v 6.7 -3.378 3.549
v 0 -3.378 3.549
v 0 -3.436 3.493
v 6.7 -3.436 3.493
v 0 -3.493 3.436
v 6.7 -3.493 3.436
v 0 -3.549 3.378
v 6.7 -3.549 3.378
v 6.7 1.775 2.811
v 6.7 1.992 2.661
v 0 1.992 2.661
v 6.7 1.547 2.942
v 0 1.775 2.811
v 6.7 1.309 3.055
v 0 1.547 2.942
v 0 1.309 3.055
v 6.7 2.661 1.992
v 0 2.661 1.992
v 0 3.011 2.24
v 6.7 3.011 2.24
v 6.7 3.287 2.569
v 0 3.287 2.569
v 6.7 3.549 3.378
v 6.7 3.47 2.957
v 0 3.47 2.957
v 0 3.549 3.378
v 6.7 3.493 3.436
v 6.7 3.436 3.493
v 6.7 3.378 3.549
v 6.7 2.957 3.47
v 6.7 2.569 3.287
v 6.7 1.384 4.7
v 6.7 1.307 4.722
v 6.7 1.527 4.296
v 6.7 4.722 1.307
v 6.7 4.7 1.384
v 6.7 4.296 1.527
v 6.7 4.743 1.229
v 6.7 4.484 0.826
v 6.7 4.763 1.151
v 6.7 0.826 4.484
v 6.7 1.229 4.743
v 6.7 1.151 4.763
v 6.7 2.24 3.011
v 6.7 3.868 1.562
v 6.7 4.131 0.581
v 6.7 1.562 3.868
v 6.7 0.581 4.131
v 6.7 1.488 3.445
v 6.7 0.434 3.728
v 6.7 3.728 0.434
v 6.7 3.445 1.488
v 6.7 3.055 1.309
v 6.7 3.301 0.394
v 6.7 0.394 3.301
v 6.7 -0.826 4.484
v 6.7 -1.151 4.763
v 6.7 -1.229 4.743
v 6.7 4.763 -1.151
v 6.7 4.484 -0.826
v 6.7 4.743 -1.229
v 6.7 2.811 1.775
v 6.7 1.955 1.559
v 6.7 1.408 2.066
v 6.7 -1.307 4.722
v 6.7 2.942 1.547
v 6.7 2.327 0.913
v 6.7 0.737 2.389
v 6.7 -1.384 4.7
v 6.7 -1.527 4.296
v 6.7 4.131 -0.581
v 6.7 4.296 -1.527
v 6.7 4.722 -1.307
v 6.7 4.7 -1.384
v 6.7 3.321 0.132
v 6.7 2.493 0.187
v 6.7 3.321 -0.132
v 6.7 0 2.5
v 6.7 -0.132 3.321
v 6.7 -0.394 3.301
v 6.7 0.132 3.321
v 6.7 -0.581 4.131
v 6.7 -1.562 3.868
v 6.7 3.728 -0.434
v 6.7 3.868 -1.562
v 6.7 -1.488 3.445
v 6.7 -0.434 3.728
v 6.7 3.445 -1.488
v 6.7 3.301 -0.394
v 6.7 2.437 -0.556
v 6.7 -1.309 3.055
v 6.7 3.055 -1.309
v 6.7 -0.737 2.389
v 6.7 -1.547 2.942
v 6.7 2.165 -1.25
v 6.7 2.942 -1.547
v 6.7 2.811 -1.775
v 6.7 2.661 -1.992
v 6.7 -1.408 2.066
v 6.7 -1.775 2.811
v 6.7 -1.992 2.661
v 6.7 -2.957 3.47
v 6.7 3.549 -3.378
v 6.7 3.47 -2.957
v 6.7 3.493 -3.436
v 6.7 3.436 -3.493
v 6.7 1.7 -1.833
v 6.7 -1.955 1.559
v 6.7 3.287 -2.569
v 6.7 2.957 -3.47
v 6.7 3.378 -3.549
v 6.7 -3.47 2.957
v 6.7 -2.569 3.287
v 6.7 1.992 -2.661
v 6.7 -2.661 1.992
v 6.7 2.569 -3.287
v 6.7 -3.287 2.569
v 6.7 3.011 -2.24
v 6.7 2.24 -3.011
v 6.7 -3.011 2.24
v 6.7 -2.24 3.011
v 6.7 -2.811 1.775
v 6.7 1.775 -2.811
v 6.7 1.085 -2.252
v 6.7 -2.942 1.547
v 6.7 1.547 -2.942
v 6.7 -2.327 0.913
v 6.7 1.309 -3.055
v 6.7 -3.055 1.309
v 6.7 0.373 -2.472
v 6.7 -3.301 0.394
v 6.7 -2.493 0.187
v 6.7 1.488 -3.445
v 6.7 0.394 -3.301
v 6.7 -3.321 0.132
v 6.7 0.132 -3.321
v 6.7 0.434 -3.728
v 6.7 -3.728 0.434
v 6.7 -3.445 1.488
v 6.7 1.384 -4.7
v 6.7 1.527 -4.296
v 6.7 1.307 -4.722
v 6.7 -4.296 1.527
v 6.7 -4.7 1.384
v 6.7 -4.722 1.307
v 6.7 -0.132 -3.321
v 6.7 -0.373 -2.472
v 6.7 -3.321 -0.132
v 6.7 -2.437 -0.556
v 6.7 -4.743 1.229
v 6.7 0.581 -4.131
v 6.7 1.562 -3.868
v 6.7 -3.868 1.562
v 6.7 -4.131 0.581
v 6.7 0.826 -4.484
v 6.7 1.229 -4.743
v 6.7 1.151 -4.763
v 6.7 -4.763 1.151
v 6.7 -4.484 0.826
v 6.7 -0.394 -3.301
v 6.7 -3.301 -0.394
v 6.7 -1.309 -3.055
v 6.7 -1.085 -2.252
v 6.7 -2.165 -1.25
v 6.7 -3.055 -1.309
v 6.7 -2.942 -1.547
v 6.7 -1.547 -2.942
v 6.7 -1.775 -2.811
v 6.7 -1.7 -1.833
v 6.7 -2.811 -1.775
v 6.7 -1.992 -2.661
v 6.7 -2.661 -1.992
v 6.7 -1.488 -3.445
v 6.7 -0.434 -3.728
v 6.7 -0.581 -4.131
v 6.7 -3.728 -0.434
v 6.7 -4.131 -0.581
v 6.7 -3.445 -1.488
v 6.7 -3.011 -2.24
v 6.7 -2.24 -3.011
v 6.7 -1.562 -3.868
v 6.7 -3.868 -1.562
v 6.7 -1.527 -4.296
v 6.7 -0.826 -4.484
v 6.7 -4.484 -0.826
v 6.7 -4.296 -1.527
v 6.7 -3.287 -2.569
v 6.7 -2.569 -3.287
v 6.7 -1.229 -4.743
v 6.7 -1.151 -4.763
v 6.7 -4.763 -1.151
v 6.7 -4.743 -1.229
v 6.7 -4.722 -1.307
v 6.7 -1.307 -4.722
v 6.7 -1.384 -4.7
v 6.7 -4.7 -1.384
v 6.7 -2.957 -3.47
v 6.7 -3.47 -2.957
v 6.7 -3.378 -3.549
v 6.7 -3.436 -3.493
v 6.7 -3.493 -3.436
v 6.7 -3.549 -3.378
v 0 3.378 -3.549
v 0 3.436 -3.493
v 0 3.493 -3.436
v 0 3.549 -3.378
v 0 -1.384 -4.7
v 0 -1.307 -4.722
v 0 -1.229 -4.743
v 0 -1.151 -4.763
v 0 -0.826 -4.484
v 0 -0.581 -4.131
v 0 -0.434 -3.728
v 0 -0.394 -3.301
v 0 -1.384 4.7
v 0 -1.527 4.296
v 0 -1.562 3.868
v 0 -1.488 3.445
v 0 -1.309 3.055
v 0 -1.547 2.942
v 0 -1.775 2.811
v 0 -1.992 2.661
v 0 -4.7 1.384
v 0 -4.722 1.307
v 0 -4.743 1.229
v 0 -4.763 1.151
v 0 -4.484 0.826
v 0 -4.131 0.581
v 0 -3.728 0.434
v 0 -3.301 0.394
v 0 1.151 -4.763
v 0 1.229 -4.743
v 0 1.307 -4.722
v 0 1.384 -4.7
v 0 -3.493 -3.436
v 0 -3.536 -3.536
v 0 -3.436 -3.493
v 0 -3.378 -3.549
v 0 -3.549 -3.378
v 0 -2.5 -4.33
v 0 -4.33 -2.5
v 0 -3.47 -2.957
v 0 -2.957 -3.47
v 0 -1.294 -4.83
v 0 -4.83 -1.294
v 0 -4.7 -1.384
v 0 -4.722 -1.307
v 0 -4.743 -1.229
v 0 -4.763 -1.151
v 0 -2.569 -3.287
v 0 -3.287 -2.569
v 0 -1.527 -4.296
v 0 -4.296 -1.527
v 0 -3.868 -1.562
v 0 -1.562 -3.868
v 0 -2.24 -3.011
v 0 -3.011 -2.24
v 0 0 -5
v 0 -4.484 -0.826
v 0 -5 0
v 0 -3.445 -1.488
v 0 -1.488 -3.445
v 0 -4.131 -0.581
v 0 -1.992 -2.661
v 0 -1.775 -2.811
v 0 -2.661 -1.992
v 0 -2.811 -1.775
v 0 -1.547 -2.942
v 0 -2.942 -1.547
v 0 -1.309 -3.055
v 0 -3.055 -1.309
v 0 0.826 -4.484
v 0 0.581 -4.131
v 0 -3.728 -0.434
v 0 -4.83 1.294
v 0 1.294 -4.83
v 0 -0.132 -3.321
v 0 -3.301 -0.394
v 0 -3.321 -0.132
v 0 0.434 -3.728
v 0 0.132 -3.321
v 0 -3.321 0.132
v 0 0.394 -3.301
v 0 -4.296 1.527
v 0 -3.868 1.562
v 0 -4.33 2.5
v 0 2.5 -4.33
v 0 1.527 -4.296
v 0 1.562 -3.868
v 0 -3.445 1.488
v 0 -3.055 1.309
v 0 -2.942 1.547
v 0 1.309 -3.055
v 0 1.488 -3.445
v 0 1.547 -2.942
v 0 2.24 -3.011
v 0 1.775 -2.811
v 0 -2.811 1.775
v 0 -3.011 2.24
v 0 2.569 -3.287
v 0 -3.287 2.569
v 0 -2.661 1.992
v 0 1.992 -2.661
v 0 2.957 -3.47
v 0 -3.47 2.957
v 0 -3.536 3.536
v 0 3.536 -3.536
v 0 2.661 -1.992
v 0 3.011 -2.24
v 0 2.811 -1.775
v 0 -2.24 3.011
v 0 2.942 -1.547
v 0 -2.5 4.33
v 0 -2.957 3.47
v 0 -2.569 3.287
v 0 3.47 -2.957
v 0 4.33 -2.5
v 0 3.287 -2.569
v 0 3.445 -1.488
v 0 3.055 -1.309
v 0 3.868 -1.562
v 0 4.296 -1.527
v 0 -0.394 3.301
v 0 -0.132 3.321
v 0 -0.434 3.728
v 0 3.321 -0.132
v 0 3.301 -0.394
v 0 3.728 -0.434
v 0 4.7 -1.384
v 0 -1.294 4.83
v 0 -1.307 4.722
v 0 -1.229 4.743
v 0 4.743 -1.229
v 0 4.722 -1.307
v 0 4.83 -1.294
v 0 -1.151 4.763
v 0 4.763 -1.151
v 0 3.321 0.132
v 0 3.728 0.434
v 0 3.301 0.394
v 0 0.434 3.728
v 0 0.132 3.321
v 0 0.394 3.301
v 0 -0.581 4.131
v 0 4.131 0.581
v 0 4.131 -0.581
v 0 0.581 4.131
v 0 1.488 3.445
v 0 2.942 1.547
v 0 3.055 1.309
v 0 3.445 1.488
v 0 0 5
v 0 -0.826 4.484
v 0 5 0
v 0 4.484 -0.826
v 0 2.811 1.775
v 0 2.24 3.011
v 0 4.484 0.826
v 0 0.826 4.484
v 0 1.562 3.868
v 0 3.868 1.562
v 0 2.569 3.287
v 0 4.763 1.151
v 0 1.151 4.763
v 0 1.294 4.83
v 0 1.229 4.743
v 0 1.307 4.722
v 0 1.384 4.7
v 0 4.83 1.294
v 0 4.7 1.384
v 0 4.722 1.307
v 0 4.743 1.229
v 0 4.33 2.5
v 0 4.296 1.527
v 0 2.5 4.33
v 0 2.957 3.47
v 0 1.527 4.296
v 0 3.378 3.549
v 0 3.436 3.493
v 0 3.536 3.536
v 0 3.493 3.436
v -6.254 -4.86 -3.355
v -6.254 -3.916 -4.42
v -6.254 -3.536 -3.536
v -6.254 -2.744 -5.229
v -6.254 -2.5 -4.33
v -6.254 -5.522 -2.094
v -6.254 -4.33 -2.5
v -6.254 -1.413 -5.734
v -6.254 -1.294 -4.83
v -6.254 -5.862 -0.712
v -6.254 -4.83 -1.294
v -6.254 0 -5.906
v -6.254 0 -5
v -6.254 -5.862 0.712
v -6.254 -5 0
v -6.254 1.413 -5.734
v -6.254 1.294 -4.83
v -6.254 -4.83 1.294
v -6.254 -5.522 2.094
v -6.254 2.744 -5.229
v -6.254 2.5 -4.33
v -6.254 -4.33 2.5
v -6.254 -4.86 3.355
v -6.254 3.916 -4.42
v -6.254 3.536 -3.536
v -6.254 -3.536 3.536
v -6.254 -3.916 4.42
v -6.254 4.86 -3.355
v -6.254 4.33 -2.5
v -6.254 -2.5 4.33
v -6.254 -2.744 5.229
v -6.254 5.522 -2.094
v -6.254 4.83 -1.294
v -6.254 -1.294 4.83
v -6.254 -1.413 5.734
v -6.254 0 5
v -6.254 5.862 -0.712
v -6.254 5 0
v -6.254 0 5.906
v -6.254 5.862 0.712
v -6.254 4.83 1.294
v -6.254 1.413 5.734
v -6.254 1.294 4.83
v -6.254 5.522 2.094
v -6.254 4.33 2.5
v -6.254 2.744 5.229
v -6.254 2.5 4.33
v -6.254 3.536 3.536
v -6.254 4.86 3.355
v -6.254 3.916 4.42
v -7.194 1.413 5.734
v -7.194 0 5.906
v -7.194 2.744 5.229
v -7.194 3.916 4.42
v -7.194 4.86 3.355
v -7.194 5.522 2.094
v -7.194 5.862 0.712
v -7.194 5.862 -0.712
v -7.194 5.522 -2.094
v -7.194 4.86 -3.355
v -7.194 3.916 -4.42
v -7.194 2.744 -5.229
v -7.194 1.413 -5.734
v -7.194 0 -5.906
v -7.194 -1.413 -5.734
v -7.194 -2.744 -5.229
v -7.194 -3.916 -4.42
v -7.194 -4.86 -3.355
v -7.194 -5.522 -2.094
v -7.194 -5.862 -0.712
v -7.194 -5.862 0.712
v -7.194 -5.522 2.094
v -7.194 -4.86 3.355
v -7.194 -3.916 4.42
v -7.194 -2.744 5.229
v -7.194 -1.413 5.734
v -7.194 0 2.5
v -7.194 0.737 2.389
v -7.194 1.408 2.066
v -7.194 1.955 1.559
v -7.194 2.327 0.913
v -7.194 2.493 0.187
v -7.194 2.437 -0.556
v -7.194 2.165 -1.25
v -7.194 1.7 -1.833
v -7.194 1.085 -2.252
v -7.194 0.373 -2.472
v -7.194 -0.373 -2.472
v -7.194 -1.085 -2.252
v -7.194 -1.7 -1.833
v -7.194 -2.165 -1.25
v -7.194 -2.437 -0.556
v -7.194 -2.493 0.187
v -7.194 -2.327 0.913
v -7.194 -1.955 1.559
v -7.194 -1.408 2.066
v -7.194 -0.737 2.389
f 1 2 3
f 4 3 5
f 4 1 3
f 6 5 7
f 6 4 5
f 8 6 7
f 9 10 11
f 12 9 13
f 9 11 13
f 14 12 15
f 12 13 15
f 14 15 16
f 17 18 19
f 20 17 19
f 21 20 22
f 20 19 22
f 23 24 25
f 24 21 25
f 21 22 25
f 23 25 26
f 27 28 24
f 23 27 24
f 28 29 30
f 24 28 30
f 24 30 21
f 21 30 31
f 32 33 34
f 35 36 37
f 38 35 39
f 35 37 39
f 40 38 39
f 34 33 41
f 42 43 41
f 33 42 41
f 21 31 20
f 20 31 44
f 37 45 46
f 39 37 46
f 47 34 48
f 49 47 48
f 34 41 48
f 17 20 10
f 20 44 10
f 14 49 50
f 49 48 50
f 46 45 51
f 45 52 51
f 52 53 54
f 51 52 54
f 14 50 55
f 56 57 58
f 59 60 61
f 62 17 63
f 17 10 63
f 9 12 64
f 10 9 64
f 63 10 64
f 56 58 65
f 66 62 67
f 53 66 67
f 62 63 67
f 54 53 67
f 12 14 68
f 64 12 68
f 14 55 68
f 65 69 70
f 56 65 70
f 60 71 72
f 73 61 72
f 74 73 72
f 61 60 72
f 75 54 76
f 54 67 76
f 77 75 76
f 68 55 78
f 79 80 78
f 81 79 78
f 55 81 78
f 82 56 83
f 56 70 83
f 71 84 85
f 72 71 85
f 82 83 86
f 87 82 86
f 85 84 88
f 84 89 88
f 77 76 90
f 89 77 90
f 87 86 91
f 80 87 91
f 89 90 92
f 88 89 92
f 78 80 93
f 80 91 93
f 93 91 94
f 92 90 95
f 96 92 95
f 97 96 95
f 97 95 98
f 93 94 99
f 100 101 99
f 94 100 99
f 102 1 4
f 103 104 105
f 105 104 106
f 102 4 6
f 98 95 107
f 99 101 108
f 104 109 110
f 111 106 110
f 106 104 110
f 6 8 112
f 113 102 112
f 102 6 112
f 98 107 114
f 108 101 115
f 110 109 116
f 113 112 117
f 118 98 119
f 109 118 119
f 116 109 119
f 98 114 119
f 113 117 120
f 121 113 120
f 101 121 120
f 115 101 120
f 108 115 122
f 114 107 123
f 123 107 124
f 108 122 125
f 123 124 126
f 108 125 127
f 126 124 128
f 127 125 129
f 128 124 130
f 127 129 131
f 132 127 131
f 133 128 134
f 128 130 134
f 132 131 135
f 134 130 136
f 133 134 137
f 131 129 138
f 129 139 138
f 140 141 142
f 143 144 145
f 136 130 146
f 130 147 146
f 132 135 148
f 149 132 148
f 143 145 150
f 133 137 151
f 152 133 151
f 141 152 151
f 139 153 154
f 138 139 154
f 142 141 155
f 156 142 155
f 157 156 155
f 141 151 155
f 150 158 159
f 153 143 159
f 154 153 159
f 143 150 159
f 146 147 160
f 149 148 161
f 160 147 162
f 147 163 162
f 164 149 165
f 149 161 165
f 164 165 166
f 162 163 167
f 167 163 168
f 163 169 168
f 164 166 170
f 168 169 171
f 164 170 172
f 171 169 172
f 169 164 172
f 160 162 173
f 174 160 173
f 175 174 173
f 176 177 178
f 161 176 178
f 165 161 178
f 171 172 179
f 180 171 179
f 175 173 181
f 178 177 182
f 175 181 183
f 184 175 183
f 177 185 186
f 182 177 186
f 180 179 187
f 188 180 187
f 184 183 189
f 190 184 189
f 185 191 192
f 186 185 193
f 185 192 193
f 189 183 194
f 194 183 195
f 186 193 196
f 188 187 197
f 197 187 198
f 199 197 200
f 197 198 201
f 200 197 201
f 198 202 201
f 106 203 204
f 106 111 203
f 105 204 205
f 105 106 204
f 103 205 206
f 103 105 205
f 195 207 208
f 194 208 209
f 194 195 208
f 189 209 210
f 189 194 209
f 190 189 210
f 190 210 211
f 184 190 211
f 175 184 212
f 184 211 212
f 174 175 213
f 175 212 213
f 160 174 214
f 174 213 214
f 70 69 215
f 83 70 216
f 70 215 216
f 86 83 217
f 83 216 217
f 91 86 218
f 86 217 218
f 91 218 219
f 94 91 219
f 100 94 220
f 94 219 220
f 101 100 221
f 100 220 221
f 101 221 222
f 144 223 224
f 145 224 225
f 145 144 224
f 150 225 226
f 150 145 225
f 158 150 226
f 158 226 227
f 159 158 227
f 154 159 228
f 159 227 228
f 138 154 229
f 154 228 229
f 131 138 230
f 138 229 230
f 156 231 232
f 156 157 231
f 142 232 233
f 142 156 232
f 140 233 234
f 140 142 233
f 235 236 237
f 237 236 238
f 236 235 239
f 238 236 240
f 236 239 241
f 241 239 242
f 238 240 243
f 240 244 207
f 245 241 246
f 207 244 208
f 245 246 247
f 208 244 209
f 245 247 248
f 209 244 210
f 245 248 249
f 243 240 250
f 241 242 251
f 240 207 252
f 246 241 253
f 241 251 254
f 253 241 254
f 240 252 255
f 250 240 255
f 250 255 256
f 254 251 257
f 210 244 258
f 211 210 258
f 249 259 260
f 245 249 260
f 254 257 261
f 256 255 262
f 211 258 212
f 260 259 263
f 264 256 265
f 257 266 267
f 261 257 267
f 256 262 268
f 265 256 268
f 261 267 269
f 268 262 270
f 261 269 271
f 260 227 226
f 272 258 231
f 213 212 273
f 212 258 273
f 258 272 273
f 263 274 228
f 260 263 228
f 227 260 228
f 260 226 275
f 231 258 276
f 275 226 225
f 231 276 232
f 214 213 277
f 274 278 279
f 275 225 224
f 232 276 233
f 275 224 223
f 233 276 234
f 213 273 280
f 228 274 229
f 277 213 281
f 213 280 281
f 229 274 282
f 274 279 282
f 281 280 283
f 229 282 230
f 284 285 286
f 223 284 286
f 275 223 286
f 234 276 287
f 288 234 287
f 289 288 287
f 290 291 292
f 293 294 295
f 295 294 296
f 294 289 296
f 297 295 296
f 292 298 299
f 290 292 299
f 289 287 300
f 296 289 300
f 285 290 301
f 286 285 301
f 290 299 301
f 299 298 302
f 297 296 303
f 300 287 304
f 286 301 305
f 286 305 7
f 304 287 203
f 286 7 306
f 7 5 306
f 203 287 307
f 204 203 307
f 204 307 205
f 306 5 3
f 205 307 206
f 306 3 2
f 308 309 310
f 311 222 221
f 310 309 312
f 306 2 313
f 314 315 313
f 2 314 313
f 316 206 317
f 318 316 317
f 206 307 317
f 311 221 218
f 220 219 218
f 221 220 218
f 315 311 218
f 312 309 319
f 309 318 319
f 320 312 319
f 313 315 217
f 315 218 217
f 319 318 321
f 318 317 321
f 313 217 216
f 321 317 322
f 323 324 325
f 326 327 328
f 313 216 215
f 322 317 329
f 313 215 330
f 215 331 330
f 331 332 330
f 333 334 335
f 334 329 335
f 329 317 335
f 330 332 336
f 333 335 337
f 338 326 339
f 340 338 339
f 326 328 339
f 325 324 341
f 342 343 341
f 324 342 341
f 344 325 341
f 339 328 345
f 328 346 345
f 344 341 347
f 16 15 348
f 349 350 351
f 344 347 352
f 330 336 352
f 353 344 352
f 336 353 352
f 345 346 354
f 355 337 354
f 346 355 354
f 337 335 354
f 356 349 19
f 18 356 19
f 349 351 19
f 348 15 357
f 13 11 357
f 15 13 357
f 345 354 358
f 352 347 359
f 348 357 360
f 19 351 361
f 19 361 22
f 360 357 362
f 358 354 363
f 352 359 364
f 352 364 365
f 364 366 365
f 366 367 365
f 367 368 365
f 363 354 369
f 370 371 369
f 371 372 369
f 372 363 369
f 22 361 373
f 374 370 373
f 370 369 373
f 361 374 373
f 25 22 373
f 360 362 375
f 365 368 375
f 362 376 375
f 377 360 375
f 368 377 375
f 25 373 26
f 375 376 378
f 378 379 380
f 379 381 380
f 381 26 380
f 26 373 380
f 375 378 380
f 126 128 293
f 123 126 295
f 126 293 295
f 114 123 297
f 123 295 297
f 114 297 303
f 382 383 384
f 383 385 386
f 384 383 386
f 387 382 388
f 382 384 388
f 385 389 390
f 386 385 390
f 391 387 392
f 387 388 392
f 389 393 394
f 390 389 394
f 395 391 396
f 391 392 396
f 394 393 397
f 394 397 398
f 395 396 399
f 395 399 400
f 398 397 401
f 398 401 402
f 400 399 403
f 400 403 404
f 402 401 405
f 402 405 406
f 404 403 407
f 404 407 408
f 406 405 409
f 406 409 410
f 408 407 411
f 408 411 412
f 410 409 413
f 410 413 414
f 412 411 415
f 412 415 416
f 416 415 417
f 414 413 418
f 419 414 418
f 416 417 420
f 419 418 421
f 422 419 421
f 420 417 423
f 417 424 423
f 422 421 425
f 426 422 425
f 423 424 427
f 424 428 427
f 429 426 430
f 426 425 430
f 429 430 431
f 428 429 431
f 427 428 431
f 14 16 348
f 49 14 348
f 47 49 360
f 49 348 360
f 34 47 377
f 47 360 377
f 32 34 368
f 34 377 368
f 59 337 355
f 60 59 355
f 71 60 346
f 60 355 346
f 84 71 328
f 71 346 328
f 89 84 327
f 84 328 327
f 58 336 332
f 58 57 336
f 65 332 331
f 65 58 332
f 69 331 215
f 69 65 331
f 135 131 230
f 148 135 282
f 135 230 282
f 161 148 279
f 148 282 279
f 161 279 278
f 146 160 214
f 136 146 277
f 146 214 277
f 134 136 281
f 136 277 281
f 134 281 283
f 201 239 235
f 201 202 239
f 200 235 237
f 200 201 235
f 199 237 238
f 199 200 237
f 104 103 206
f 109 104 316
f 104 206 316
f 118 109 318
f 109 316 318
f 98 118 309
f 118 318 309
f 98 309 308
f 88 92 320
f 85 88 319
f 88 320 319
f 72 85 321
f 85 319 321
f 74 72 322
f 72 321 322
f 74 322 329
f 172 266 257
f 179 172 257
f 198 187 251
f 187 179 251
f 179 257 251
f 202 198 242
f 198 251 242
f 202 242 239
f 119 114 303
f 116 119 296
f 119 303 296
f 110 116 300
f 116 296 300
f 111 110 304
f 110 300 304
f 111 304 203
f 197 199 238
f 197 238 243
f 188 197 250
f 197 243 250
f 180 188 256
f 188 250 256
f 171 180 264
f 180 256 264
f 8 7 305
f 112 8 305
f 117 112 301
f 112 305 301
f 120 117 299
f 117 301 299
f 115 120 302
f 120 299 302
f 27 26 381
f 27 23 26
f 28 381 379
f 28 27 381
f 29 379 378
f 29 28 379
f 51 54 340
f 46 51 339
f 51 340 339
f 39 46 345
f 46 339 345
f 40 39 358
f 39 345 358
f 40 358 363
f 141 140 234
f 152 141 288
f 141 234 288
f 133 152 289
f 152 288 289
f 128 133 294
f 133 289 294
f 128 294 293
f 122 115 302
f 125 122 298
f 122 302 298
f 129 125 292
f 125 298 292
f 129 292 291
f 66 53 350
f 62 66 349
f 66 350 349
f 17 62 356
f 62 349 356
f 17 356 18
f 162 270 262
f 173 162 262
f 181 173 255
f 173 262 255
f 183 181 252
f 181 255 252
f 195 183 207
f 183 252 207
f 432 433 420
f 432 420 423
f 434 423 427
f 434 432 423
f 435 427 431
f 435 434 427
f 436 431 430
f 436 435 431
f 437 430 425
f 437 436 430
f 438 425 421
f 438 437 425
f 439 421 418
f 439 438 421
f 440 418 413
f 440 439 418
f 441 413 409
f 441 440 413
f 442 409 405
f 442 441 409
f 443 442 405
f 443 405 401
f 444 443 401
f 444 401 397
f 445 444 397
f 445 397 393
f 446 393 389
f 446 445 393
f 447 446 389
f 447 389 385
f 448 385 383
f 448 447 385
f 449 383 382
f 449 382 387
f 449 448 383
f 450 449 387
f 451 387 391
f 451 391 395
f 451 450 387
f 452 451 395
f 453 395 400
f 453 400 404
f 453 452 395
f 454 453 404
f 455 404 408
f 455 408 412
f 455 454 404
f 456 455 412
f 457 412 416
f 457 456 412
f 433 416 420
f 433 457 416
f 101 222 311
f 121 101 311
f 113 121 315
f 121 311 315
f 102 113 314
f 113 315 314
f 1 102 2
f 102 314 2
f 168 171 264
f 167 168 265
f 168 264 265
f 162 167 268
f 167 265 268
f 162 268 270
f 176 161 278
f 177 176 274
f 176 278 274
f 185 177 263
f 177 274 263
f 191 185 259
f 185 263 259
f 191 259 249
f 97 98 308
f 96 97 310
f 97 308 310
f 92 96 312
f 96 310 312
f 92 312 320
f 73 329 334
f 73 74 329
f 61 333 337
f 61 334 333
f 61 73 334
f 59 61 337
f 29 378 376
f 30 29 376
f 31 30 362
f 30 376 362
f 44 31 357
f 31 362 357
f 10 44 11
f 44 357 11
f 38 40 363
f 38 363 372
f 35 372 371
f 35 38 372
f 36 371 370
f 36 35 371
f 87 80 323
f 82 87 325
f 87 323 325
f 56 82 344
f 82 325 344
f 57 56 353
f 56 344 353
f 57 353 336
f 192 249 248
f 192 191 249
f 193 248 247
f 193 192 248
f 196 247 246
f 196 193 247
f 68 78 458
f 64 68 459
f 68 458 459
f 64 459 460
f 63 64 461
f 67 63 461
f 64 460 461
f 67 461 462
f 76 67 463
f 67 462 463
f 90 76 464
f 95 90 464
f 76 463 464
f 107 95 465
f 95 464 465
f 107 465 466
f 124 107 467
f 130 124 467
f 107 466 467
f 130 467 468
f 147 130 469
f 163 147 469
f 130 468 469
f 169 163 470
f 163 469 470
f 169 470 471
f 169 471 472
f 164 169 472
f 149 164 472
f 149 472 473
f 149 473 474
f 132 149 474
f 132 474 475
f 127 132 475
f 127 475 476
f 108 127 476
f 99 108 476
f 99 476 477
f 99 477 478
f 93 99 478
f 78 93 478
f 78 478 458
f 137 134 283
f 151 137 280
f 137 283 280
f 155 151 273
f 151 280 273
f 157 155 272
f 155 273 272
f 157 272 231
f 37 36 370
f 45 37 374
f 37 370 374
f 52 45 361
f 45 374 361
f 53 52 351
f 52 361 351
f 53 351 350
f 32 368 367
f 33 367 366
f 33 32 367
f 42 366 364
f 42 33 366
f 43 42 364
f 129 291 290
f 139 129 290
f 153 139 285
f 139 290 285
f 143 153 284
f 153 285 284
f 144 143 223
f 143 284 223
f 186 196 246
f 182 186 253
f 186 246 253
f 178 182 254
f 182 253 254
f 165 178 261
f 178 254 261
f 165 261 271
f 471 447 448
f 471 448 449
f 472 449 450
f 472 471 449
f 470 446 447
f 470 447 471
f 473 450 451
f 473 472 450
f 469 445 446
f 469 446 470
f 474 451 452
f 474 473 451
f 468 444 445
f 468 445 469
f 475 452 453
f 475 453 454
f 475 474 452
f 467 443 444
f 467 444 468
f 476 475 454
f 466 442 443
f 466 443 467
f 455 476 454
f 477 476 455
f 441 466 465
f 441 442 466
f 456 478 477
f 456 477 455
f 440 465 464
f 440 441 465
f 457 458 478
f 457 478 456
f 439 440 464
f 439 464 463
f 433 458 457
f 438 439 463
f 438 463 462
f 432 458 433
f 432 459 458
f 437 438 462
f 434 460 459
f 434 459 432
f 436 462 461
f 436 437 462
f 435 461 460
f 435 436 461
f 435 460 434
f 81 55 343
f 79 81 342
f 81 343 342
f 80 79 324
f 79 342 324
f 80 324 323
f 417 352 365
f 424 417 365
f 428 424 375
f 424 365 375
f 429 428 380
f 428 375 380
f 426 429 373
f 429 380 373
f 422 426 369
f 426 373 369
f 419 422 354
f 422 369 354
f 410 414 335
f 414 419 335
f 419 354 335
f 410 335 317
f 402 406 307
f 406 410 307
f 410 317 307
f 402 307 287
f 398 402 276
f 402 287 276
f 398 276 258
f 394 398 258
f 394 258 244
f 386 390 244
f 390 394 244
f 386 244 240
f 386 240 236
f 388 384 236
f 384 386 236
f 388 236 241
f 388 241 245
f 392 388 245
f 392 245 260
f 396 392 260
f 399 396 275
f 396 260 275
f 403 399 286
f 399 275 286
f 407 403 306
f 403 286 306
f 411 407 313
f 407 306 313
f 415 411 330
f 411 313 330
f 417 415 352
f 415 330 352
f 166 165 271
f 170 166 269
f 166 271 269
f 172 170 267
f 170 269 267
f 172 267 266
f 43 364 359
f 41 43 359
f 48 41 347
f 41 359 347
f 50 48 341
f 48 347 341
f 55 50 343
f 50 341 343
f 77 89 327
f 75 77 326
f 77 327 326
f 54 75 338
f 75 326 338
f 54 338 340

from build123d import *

# Parameters (mm, degrees)
BASPROSKE_W         = 6.7
BASPROSKE_H         = 4.9
TOOTHCUT_DEPTH      = 10.638983349
TEETHCUTS_COUNT     = 12
TEETHCUTS_ANGLE     = 330
BORSKE_R            = 0.4
BORE_DEPTH          = 50.0000508
SKETCH1_R           = 5
BOSS_EXTRUDE1_DEPTH = 7.1938
SKETCH3_R           = 5.9055
BOSS_EXTRUDE2_DEPTH = 0.9398
SKETCH2_R           = 2.5
CUT_EXTRUDE1_DEPTH  = 17.210722962


with BuildPart() as part:
    # BasProSke → Base-Revolve (revolve)
    with BuildSketch(Plane(origin=(0, 0, 0), x_dir=(1, 0, 0), z_dir=(0, 1, 0)), mode=Mode.PRIVATE) as base_revolve_sk:
        with Locations((3.35, 2.45)):
            Rectangle(BASPROSKE_W, BASPROSKE_H)
    revolve(base_revolve_sk.sketch.rotate(Axis((-10, 0, 0), (1, 0, 0)), 180), axis=Axis((-10, 0, 0), (1, 0, 0)))

    # TooCutSke → ToothCut (cut, through all)
    with BuildSketch(Plane(origin=(0, 0, 0), x_dir=(0, 0, -1), z_dir=(1, 0, 0))):
        with BuildLine():
            ThreePointArc((0.394109641, 3.300553528), (0, 3.324), (-0.394109641, 3.300553528))
            ThreePointArc((-0.394109641, 3.300553528), (-0.589367544, 4.146348526), (-1.180740601, 4.781779668))
            ThreePointArc((-1.180740601, 4.781779668), (0, 4.9254), (1.180740601, 4.781779668))
            ThreePointArc((1.180740601, 4.781779668), (0.589367544, 4.146348526), (0.394109641, 3.300553528))
        make_face()
    toothcut = extrude(amount=TOOTHCUT_DEPTH, mode=Mode.SUBTRACT)

    # TeethCuts: ToothCut ×12 about axis
    teethcuts_axis = Axis((-10, 0, 0), (1, 0, 0))
    for i in range(1, TEETHCUTS_COUNT):
        add(toothcut.rotate(teethcuts_axis, i * TEETHCUTS_ANGLE / (TEETHCUTS_COUNT - 1)), mode=Mode.SUBTRACT)

    # BorSke → Bore (cut, symmetric)
    with BuildSketch(Plane(origin=(0, 0, 0), x_dir=(0, 0, -1), z_dir=(1, 0, 0))):
        with Locations(Location((0, 0, 0), (0, 0, 180))):
            Circle(BORSKE_R)
    extrude(amount=BORE_DEPTH, both=True, mode=Mode.SUBTRACT)

    # Sketch1 → Boss-Extrude1 (add)
    with BuildSketch(Plane.ZY):
        Circle(SKETCH1_R)
    extrude(amount=BOSS_EXTRUDE1_DEPTH)

    # Sketch3 → Boss-Extrude2 (add)
    with BuildSketch(Plane.ZY.offset(7.1938)):
        Circle(SKETCH3_R)
    extrude(amount=-BOSS_EXTRUDE2_DEPTH)

    # Sketch2 → Cut-Extrude1 (cut, through all)
    with BuildSketch(Plane.ZY.offset(7.1938)):
        Circle(SKETCH2_R)
    extrude(amount=-CUT_EXTRUDE1_DEPTH, mode=Mode.SUBTRACT)


solid = part.part
